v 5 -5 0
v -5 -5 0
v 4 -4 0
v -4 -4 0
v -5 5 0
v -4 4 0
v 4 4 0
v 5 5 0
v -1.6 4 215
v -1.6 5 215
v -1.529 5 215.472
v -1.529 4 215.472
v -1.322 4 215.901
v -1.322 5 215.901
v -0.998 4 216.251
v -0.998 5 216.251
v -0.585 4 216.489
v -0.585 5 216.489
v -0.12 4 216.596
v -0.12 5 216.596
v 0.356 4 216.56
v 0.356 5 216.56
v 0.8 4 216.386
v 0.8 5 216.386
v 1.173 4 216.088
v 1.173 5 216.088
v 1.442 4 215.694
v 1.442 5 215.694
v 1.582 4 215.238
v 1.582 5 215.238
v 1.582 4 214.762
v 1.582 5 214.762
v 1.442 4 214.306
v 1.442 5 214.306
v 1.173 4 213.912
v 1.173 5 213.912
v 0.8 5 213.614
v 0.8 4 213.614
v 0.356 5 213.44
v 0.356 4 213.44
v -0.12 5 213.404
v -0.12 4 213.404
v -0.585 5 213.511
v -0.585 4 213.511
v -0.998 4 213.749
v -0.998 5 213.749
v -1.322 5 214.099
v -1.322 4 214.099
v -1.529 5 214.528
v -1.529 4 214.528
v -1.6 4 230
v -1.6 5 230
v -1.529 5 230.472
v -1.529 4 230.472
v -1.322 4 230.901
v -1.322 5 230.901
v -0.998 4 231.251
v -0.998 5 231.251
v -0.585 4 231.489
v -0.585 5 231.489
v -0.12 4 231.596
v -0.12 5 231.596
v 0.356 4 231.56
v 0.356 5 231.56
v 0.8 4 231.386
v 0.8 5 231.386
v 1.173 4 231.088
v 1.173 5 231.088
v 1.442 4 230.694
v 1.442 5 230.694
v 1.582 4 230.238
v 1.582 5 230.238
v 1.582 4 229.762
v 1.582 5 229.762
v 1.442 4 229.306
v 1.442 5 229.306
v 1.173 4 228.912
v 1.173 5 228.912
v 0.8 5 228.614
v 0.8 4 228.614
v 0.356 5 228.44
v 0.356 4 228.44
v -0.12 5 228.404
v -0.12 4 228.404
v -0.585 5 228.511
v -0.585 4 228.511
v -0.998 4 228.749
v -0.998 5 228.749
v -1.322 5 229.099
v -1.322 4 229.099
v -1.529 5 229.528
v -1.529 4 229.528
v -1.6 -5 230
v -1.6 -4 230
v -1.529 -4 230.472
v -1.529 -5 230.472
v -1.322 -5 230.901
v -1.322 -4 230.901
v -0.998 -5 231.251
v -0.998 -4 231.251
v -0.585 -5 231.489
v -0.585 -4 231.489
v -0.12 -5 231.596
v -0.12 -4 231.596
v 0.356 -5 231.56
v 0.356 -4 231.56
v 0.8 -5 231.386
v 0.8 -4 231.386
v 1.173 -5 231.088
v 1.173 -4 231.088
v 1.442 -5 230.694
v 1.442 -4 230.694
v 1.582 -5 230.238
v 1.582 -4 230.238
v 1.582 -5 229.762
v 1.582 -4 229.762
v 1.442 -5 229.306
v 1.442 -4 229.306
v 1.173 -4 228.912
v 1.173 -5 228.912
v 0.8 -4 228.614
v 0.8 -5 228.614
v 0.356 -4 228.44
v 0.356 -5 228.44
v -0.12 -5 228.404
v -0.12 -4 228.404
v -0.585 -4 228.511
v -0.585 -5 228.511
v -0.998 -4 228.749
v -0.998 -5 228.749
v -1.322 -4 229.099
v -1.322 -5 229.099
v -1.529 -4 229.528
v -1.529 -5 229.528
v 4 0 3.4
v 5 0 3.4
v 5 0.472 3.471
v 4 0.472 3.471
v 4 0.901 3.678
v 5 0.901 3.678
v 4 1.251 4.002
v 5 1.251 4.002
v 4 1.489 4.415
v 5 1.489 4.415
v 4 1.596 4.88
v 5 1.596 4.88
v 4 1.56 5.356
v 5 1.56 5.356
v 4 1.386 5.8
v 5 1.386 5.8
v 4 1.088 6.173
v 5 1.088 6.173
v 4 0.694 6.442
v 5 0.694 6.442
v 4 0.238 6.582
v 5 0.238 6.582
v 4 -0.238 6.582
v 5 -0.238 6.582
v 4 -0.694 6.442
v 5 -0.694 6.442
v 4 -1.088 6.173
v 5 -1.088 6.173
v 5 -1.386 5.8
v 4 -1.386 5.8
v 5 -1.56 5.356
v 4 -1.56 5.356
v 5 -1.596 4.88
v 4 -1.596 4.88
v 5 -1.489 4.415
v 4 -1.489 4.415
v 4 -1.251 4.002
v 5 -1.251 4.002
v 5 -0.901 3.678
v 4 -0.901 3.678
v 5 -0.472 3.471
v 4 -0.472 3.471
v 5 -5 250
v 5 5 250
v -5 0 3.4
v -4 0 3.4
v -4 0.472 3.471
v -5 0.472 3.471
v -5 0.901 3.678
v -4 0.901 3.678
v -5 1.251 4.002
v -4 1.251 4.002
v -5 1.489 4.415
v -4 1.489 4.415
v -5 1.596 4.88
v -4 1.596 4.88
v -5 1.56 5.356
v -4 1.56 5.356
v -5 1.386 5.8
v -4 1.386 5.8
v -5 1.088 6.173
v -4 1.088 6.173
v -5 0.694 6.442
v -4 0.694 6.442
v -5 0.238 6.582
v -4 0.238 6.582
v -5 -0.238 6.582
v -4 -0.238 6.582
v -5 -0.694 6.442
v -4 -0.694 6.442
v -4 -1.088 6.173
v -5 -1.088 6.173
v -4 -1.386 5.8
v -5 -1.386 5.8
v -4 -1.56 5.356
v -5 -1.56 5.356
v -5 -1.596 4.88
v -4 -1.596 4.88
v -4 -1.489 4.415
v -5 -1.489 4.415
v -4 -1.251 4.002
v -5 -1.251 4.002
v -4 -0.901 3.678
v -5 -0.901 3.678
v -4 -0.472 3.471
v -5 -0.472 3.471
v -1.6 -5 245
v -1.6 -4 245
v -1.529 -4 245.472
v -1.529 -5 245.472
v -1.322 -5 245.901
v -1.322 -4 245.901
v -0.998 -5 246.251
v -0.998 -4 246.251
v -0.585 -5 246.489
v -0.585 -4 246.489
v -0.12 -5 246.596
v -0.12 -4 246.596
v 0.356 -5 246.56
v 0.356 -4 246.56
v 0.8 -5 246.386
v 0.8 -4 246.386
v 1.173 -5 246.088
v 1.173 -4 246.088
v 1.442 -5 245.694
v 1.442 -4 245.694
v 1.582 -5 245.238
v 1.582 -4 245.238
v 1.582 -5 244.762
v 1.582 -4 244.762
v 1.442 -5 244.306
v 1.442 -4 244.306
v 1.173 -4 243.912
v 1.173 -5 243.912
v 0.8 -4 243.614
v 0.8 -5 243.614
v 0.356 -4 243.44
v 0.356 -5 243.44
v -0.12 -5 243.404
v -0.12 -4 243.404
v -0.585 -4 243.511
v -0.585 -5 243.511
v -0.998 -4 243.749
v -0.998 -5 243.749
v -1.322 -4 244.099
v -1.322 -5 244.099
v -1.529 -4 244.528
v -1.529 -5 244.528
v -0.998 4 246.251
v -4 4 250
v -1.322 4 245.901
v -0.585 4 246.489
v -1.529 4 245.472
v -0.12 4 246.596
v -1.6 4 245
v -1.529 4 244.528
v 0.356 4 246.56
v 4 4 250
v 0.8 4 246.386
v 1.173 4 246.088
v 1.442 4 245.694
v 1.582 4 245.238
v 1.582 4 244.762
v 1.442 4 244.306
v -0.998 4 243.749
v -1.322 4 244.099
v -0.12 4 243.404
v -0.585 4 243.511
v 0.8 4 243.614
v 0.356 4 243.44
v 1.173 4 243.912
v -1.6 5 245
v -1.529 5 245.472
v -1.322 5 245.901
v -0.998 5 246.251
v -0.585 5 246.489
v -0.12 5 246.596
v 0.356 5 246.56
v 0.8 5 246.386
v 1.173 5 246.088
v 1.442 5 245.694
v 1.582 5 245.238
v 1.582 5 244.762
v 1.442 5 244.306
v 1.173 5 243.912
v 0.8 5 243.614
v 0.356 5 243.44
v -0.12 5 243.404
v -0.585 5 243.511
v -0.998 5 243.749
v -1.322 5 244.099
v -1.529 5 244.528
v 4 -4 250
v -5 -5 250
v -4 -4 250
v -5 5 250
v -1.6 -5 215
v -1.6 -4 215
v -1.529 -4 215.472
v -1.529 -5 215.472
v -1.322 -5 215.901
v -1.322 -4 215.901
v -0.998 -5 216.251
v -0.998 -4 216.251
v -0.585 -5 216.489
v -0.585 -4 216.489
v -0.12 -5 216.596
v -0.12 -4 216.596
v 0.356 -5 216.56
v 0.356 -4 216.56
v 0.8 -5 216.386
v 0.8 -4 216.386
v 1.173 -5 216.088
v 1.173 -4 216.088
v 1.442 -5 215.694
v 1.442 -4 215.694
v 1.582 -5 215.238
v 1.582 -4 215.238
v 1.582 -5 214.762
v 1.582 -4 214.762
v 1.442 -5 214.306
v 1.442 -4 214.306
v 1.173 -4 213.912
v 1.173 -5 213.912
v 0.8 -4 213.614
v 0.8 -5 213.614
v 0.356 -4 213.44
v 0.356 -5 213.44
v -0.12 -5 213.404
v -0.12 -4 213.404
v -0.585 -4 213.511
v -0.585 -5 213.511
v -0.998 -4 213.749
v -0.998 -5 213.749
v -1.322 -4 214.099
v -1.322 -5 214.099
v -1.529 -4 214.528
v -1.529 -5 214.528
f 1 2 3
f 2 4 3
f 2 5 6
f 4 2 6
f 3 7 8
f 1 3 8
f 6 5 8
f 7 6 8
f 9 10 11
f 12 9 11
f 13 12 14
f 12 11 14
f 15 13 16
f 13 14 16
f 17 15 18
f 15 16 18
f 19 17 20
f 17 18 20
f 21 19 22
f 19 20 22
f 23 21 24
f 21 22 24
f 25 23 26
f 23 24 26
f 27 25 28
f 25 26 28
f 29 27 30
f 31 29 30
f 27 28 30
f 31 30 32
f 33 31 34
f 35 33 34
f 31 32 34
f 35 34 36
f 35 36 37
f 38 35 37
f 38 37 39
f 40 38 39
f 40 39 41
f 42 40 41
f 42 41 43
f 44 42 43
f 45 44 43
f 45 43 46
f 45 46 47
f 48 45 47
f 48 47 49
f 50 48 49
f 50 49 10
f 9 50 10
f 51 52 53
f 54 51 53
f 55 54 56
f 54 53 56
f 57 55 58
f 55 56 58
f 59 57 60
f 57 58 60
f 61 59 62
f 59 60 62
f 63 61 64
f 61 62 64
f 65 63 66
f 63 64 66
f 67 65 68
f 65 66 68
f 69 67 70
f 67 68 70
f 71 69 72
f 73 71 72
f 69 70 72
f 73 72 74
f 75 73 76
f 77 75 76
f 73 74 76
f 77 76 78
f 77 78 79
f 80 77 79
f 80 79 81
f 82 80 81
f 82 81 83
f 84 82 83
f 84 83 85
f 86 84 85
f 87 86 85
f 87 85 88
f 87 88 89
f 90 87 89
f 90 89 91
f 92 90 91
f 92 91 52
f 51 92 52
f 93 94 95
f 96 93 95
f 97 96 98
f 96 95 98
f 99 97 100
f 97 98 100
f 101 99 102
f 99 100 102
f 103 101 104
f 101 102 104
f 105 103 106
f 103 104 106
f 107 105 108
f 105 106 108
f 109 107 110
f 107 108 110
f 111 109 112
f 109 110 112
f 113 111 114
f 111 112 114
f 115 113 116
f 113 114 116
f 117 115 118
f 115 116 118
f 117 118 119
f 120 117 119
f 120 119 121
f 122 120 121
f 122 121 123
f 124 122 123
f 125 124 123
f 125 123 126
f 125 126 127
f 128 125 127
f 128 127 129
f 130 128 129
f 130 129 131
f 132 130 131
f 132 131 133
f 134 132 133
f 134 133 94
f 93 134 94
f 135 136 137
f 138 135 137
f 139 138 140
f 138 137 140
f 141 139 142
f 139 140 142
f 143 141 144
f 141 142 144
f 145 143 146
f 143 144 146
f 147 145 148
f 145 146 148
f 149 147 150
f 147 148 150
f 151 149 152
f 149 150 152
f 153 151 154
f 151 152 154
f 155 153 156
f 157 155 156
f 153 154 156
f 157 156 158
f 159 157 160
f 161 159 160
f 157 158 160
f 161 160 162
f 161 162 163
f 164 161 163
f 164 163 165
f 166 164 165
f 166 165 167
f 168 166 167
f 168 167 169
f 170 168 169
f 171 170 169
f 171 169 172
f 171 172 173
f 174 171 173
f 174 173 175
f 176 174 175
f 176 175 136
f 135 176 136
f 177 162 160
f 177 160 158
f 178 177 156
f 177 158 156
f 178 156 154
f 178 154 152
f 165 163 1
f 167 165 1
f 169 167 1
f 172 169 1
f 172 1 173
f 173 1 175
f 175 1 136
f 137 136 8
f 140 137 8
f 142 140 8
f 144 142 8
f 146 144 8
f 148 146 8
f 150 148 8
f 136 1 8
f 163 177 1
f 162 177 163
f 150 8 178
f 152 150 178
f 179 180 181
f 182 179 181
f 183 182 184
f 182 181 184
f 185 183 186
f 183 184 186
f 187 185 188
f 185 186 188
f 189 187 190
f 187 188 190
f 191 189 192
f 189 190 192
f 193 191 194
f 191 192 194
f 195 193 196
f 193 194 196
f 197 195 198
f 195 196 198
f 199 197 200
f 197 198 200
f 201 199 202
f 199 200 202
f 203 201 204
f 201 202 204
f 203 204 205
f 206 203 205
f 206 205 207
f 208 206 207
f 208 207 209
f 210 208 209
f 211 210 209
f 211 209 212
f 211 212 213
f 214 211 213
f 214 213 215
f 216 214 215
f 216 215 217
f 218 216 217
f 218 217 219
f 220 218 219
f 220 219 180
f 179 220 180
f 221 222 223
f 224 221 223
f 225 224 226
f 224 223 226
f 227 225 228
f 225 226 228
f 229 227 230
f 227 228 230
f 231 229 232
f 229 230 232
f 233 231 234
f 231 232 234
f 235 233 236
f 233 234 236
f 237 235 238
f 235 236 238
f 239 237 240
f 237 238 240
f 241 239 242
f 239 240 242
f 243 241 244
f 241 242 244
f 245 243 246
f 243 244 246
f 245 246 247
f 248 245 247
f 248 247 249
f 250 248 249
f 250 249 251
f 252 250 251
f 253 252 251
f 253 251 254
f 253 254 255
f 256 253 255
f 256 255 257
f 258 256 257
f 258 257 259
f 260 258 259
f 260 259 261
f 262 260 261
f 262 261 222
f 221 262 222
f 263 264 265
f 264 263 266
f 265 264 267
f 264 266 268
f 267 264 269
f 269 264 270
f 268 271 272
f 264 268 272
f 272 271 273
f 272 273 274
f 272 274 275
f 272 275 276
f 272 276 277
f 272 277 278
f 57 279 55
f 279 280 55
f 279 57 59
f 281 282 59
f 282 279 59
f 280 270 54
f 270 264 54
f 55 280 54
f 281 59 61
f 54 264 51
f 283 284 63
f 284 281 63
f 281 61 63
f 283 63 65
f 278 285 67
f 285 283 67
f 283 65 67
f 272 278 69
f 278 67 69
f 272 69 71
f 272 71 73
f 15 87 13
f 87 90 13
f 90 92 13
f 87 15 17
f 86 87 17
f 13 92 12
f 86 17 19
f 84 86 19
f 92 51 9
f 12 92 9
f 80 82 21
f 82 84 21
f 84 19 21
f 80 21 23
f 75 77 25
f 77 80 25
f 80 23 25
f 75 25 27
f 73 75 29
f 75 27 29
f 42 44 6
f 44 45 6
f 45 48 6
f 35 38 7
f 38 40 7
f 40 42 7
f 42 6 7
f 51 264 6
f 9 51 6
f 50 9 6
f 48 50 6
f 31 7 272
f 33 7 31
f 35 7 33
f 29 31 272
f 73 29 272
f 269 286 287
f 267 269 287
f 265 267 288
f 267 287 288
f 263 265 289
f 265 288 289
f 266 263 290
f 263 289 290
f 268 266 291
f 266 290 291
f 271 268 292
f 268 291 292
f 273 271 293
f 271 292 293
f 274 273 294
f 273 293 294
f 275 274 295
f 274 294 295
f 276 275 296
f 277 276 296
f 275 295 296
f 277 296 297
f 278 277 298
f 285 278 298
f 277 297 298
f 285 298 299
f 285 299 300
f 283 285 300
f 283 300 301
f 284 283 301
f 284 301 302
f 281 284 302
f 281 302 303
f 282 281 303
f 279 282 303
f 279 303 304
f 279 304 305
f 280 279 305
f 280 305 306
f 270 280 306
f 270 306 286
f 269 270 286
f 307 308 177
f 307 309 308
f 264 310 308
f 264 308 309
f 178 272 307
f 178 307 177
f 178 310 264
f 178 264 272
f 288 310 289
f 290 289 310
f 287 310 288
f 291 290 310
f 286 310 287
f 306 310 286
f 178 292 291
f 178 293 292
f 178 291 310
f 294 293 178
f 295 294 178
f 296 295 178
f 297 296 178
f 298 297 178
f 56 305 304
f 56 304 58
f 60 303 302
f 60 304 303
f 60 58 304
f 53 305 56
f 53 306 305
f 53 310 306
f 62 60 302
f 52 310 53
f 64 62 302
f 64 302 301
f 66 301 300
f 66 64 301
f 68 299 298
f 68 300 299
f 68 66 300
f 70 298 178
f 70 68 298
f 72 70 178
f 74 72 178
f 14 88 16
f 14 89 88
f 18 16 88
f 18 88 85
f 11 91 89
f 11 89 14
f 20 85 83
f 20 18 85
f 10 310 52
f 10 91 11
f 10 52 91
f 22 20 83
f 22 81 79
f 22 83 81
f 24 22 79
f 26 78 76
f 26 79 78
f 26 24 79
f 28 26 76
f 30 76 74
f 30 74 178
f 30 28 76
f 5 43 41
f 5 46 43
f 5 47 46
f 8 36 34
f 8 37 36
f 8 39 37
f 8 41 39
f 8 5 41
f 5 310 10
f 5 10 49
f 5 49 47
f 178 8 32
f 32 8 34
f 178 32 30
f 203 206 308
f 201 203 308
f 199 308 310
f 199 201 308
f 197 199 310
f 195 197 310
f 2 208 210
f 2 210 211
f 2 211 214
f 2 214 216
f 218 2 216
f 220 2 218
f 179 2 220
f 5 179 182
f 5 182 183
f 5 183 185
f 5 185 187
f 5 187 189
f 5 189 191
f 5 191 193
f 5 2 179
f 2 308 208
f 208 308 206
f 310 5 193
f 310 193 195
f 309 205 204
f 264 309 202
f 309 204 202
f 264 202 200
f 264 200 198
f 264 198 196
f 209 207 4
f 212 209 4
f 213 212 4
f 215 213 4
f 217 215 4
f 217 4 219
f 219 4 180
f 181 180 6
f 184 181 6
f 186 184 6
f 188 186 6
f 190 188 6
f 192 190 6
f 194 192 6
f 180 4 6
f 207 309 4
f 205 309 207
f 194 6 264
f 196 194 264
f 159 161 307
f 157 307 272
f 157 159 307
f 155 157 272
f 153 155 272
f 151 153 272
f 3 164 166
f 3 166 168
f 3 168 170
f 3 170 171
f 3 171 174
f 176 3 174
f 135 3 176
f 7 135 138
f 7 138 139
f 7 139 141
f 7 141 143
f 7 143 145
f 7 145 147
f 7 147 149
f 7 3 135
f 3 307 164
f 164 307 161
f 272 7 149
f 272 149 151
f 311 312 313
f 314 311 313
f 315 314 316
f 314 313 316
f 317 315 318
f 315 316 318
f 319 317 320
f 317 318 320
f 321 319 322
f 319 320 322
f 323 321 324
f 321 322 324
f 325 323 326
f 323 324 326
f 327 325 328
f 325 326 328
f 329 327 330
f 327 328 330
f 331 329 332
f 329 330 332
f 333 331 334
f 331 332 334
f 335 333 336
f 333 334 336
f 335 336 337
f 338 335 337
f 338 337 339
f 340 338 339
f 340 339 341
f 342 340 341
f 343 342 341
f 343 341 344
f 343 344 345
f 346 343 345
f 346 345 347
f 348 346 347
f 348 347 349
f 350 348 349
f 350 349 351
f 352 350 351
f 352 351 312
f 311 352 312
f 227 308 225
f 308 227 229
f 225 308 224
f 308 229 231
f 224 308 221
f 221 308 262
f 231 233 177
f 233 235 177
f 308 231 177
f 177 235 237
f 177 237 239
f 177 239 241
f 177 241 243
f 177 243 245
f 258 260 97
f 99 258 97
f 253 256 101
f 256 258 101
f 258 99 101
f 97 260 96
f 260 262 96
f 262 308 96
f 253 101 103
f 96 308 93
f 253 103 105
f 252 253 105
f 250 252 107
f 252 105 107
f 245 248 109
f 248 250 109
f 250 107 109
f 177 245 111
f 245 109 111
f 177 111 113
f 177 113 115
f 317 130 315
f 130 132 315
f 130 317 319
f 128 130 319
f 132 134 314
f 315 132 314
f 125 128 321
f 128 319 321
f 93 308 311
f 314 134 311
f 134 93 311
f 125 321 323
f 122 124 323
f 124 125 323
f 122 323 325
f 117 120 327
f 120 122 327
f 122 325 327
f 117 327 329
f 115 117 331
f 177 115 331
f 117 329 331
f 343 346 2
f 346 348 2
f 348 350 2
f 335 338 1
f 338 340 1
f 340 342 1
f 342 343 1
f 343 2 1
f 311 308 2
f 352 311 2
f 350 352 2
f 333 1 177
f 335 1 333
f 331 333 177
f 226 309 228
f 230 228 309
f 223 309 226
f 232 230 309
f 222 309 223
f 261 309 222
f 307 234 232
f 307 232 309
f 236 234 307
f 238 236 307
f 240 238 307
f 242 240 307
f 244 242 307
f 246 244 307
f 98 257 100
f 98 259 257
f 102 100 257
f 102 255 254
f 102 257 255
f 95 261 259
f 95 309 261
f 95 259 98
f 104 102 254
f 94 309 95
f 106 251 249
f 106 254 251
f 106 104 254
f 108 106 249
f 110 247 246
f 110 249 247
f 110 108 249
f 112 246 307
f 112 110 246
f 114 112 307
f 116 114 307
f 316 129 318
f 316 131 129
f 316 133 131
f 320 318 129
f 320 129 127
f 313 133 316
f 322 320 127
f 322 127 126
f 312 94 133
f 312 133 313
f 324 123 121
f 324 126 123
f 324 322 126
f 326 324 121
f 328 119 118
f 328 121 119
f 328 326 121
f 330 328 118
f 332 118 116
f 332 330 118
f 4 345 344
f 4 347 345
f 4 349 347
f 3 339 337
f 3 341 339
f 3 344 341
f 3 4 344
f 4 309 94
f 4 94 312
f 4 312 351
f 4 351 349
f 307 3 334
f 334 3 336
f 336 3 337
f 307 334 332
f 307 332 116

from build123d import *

# Parameters (mm, degrees)
SKETCH_1_W          = 10
SKETCH_1_H          = 10
SKETCH_1_W_2        = 8
SKETCH_1_H_2        = 8
EXTRUDE_1_DEPTH     = 250
SKETCH_2_R          = 1.6
CUT_EXTRUDE_1_DEPTH = 251.249875125
SKETCH_3_R          = 1.6
CUT_EXTRUDE_2_DEPTH = 60


with BuildPart() as part:
    # ｽｹｯﾁ1 → ﾎﾞｽ - 押し出し1 (new body)
    with BuildSketch(Plane.XY):
        Rectangle(SKETCH_1_W, SKETCH_1_H)
        Rectangle(SKETCH_1_W_2, SKETCH_1_H_2, mode=Mode.SUBTRACT)
    extrude(amount=EXTRUDE_1_DEPTH)

    # ｽｹｯﾁ2 → ｶｯﾄ - 押し出し1 (cut, through all)
    with BuildSketch(Plane(origin=(0, 5, 0), x_dir=(1, 0, 0), z_dir=(0, 1, 0))):
        with Locations(Location((0, -215, 0), (0, 0, 180))):
            Circle(SKETCH_2_R)
        with Locations(Location((0, -245, 0), (0, 0, 180))):
            Circle(SKETCH_2_R)
        with Locations(Location((0, -230, 0), (0, 0, 180))):
            Circle(SKETCH_2_R)
    extrude(amount=-CUT_EXTRUDE_1_DEPTH, mode=Mode.SUBTRACT)

    # ｽｹｯﾁ3 → ｶｯﾄ - 押し出し2 (cut)
    with BuildSketch(Plane(origin=(5, 0, 0), x_dir=(0, 0, -1), z_dir=(1, 0, 0))):
        with Locations((-5, 0)):
            Circle(SKETCH_3_R)
    extrude(amount=-CUT_EXTRUDE_2_DEPTH, mode=Mode.SUBTRACT)


solid = part.part
